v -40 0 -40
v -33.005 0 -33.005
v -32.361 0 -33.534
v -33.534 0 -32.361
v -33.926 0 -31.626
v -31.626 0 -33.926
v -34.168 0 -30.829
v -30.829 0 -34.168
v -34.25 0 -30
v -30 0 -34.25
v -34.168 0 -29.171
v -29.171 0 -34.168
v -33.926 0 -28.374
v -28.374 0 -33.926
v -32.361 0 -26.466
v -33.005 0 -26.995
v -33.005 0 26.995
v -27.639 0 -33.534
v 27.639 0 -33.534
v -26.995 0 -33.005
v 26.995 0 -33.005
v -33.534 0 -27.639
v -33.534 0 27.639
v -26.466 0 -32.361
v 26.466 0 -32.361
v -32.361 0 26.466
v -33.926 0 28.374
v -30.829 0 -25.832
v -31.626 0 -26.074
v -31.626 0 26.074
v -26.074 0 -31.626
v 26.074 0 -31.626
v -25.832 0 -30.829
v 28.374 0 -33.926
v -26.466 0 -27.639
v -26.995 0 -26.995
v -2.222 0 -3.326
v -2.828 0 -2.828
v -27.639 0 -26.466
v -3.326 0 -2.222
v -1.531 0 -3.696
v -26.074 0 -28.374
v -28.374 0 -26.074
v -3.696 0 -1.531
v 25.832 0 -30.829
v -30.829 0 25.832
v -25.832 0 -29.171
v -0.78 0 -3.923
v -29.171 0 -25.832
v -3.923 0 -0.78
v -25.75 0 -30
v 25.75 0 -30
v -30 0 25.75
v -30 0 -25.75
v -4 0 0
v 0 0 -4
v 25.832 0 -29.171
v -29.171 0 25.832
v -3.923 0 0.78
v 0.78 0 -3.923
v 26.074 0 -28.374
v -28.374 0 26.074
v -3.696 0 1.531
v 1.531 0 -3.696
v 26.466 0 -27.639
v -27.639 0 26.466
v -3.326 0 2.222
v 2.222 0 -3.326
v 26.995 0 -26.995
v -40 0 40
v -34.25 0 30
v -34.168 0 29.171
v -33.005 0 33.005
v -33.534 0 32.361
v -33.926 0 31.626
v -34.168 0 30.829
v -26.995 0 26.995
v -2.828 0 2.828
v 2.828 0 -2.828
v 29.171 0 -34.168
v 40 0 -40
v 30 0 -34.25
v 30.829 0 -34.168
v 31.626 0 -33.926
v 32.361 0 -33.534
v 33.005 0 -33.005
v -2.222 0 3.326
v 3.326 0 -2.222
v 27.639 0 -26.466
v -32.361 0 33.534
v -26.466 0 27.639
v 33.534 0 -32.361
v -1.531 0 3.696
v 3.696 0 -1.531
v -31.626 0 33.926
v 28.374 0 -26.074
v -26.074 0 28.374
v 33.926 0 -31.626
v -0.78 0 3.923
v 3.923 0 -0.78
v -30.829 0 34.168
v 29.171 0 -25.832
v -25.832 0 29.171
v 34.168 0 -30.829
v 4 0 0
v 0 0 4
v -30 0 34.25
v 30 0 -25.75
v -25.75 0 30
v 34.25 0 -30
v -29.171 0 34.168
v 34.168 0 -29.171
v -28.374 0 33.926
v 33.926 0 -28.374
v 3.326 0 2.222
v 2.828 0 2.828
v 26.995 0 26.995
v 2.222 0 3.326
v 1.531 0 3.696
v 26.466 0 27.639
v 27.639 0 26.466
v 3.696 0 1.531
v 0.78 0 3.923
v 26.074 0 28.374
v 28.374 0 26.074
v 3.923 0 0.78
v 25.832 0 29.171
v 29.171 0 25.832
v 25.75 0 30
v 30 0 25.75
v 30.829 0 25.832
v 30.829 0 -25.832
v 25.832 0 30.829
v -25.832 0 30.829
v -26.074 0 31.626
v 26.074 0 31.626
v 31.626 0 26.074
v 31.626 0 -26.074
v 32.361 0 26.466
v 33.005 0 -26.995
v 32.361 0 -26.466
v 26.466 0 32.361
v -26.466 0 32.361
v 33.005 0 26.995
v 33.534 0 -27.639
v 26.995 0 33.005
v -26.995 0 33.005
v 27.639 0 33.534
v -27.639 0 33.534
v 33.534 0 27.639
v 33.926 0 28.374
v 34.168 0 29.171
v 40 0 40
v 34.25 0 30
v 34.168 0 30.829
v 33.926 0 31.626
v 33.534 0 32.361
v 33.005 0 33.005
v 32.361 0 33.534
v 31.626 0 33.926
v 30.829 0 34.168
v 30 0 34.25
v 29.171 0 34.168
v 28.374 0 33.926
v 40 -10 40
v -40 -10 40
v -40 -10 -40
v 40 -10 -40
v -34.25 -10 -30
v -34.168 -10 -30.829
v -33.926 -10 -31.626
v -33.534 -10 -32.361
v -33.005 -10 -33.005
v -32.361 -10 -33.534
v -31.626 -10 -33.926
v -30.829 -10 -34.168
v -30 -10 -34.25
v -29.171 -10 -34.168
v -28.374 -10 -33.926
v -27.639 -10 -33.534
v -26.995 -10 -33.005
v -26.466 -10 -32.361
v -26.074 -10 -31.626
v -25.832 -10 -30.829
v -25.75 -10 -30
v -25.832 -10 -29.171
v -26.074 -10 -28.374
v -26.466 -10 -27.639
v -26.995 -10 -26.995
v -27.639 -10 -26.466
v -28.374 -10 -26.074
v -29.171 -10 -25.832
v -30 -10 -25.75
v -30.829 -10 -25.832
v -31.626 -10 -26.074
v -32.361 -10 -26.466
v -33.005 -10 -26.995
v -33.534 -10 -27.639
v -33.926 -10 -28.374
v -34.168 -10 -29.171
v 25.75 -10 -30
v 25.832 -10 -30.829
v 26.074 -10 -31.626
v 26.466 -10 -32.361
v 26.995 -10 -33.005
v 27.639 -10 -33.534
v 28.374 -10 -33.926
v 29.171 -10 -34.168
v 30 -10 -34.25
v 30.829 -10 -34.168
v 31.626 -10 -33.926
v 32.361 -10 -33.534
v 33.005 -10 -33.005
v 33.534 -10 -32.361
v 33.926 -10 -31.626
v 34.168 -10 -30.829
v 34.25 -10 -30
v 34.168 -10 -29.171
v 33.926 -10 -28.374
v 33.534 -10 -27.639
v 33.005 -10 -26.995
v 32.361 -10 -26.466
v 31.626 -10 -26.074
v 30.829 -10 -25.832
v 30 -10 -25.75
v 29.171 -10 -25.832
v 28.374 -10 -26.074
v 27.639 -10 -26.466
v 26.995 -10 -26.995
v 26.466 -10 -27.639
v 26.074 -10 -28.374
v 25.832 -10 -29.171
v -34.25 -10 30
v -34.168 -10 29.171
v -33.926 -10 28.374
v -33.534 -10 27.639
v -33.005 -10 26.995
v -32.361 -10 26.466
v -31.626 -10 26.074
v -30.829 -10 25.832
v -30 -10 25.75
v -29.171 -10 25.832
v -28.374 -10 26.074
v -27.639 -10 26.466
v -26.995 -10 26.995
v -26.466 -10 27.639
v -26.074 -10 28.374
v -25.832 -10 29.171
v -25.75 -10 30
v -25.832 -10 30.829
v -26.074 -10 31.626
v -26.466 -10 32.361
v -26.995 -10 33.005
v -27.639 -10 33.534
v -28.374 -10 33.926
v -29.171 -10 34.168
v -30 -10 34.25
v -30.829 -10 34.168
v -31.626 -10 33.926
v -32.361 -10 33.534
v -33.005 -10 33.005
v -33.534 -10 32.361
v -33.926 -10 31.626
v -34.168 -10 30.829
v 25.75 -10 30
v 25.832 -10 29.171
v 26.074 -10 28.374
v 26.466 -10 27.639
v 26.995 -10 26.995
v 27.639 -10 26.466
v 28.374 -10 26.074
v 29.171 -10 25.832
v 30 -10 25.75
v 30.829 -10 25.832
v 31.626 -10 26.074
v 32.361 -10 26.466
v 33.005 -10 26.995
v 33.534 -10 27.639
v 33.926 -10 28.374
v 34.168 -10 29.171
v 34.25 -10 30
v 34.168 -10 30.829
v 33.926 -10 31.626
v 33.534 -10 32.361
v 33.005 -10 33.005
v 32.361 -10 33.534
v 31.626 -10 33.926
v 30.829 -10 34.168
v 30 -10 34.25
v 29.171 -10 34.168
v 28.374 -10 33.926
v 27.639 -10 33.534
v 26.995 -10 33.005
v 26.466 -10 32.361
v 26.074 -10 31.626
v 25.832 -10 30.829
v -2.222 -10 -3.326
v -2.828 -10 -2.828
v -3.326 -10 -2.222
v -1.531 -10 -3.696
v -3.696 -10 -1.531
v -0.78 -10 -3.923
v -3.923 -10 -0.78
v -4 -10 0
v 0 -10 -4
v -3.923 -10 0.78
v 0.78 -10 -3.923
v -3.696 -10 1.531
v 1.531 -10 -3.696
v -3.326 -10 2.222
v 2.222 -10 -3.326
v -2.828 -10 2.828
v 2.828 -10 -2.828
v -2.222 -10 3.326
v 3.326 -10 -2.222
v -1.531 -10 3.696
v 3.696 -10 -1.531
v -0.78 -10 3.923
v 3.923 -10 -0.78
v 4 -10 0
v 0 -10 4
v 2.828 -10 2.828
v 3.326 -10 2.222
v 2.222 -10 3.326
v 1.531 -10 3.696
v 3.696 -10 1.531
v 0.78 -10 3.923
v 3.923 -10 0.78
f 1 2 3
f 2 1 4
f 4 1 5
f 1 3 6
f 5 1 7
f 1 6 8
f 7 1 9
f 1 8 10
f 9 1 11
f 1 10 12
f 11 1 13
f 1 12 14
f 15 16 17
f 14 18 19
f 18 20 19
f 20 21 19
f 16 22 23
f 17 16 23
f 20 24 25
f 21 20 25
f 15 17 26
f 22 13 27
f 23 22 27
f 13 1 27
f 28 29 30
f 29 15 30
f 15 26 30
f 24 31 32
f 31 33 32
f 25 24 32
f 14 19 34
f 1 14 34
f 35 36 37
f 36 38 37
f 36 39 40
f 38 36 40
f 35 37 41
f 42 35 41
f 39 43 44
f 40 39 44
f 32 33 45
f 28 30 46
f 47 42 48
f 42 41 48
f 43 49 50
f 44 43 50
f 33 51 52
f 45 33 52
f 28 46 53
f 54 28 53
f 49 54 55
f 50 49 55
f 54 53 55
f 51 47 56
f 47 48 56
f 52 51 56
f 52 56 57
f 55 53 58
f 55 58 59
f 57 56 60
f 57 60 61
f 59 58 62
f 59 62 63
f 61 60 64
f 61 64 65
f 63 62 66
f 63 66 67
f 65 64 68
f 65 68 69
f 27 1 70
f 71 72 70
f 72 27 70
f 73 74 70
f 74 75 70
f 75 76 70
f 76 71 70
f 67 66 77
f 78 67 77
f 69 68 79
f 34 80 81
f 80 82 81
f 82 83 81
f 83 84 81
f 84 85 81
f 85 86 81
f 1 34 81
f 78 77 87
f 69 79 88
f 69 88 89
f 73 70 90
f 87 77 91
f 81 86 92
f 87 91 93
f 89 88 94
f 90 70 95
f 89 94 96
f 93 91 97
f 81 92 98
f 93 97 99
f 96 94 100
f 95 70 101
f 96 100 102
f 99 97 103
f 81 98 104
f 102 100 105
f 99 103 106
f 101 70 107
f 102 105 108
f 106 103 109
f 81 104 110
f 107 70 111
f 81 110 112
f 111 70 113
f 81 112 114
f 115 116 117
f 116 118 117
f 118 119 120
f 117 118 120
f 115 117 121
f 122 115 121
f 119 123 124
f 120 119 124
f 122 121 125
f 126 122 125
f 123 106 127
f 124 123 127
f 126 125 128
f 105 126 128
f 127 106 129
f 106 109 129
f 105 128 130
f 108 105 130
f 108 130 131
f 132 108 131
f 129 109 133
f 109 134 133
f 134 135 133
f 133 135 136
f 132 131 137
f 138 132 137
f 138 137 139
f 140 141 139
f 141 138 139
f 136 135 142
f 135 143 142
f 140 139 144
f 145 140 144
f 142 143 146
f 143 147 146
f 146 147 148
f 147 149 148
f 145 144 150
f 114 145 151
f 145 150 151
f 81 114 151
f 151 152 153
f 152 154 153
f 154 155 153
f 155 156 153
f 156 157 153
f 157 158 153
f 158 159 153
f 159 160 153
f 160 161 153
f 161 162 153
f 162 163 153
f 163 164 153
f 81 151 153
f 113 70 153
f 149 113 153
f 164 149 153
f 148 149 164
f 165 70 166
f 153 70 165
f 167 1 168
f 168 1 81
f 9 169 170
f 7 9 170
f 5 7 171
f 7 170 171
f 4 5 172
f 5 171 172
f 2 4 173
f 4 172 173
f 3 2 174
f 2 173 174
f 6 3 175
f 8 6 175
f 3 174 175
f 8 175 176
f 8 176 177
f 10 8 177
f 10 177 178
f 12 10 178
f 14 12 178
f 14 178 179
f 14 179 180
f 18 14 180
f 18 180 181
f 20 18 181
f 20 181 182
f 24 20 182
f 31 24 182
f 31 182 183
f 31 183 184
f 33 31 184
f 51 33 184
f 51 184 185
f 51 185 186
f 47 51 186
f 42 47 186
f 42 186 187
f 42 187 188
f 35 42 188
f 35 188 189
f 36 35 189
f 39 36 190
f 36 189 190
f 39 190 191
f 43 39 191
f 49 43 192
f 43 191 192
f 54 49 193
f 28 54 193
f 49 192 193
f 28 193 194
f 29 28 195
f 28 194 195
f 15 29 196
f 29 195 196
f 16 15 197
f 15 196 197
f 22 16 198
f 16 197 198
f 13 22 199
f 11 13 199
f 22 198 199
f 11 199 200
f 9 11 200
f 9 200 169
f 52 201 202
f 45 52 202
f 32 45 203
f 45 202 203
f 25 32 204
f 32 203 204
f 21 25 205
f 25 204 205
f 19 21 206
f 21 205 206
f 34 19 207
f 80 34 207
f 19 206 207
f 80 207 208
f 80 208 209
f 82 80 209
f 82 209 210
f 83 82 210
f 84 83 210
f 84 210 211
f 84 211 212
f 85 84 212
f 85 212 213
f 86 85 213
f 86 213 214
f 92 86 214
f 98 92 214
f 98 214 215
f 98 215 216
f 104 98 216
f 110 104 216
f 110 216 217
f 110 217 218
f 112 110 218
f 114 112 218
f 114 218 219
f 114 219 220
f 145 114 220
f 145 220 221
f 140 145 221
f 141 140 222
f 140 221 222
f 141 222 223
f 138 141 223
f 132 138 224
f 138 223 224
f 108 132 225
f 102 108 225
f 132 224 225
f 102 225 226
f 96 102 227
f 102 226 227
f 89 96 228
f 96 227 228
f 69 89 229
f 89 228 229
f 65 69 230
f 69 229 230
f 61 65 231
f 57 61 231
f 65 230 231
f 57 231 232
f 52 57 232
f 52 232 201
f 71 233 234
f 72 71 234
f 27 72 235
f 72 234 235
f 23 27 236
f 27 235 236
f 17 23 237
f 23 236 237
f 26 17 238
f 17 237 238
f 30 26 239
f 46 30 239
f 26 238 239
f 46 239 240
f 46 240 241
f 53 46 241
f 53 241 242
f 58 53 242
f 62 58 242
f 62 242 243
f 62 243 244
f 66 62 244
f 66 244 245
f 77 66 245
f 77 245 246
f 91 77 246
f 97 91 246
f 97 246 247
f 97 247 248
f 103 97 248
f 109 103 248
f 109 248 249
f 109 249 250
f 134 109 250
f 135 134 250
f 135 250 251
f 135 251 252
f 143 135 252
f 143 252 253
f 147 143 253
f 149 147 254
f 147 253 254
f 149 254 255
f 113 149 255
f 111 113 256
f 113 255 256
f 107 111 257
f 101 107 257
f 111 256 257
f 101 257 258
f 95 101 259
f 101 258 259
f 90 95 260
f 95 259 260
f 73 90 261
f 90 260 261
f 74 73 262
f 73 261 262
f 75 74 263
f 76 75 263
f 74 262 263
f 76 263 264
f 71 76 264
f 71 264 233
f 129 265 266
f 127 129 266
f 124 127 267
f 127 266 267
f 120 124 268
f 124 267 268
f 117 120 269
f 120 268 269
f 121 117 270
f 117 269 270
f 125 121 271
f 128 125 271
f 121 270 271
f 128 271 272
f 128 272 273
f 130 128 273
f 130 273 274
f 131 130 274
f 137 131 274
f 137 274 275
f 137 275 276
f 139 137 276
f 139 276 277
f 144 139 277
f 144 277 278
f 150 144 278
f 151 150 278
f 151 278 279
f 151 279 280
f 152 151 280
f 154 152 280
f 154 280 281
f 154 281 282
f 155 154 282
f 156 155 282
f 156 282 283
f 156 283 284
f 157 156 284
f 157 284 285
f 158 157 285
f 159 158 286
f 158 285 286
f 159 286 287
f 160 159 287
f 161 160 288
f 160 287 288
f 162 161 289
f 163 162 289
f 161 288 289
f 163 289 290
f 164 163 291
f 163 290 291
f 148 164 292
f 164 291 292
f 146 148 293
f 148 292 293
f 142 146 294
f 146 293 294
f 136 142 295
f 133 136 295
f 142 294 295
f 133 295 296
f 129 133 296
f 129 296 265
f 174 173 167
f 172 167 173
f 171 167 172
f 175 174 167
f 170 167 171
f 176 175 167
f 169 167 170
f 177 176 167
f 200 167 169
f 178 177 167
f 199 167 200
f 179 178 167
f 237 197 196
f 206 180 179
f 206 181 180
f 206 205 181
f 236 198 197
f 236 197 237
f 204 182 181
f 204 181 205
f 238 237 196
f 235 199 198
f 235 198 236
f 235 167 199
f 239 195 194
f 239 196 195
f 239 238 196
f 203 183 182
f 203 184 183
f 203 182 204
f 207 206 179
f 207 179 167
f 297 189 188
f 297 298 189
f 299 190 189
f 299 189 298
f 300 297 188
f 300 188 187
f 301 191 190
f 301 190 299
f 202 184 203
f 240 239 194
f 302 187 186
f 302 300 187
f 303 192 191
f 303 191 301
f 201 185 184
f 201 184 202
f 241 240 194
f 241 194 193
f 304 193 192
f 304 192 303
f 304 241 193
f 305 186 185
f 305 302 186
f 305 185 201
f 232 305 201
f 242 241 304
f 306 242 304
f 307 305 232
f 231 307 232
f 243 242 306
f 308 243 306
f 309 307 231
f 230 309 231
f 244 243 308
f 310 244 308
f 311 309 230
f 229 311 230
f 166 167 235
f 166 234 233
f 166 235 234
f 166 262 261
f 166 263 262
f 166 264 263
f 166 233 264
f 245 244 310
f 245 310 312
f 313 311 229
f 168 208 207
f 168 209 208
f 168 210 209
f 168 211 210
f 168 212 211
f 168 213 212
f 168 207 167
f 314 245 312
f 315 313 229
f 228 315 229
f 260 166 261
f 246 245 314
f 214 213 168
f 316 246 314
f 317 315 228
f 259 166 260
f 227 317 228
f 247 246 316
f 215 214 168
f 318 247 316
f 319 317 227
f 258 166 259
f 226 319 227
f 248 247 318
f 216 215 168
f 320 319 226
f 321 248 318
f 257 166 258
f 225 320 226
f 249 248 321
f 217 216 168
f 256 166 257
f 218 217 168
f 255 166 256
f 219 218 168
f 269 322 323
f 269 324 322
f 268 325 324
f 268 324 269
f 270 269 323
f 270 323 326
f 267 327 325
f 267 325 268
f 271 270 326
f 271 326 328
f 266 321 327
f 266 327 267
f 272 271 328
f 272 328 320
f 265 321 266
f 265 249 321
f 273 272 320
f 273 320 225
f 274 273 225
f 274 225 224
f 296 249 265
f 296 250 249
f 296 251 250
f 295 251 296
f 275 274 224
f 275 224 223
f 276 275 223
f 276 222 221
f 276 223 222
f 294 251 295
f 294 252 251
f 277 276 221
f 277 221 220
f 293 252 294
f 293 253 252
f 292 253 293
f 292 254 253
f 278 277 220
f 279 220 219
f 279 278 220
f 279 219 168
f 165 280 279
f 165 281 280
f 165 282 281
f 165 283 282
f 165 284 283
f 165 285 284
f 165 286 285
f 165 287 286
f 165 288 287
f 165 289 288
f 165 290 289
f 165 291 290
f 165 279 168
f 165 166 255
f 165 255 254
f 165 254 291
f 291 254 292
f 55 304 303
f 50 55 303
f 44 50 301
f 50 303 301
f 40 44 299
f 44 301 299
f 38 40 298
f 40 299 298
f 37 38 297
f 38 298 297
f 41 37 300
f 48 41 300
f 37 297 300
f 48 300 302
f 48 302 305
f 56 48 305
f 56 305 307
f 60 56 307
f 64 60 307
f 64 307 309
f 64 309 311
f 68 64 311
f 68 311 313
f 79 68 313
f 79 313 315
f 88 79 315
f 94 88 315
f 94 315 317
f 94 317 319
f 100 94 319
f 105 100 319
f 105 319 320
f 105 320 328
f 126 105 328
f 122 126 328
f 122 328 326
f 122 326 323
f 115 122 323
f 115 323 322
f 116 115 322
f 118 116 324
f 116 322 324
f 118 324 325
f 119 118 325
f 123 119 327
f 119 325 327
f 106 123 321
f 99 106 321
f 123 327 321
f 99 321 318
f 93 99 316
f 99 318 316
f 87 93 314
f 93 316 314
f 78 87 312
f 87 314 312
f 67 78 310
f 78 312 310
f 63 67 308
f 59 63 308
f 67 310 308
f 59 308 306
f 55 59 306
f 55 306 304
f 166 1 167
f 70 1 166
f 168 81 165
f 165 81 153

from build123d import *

# Parameters (mm, degrees)
F0_W     = 80
F0_H     = 80
F1_DEPTH = 10
F2_D     = 8.5
F4_D     = 8


with BuildPart() as f1:
    # F0 (on Front) → F1 (new body)
    with BuildSketch(Plane.XZ):
        Rectangle(F0_W, F0_H)
    extrude(amount=F1_DEPTH)

    # F2 (through all)
    with Locations(Plane(origin=(0, 0, 0), x_dir=(1, 0, 0), z_dir=(0, 1, 0))):
        with Locations((-30, 30), (30, 30), (30, -30), (-30, -30)):
            Hole(F2_D / 2)

    # F4 (through all)
    with Locations(Plane(origin=(0, 0, 0), x_dir=(1, 0, 0), z_dir=(0, 1, 0))):
        with Locations((0, 0)):
            Hole(F4_D / 2)


solid = f1.part
